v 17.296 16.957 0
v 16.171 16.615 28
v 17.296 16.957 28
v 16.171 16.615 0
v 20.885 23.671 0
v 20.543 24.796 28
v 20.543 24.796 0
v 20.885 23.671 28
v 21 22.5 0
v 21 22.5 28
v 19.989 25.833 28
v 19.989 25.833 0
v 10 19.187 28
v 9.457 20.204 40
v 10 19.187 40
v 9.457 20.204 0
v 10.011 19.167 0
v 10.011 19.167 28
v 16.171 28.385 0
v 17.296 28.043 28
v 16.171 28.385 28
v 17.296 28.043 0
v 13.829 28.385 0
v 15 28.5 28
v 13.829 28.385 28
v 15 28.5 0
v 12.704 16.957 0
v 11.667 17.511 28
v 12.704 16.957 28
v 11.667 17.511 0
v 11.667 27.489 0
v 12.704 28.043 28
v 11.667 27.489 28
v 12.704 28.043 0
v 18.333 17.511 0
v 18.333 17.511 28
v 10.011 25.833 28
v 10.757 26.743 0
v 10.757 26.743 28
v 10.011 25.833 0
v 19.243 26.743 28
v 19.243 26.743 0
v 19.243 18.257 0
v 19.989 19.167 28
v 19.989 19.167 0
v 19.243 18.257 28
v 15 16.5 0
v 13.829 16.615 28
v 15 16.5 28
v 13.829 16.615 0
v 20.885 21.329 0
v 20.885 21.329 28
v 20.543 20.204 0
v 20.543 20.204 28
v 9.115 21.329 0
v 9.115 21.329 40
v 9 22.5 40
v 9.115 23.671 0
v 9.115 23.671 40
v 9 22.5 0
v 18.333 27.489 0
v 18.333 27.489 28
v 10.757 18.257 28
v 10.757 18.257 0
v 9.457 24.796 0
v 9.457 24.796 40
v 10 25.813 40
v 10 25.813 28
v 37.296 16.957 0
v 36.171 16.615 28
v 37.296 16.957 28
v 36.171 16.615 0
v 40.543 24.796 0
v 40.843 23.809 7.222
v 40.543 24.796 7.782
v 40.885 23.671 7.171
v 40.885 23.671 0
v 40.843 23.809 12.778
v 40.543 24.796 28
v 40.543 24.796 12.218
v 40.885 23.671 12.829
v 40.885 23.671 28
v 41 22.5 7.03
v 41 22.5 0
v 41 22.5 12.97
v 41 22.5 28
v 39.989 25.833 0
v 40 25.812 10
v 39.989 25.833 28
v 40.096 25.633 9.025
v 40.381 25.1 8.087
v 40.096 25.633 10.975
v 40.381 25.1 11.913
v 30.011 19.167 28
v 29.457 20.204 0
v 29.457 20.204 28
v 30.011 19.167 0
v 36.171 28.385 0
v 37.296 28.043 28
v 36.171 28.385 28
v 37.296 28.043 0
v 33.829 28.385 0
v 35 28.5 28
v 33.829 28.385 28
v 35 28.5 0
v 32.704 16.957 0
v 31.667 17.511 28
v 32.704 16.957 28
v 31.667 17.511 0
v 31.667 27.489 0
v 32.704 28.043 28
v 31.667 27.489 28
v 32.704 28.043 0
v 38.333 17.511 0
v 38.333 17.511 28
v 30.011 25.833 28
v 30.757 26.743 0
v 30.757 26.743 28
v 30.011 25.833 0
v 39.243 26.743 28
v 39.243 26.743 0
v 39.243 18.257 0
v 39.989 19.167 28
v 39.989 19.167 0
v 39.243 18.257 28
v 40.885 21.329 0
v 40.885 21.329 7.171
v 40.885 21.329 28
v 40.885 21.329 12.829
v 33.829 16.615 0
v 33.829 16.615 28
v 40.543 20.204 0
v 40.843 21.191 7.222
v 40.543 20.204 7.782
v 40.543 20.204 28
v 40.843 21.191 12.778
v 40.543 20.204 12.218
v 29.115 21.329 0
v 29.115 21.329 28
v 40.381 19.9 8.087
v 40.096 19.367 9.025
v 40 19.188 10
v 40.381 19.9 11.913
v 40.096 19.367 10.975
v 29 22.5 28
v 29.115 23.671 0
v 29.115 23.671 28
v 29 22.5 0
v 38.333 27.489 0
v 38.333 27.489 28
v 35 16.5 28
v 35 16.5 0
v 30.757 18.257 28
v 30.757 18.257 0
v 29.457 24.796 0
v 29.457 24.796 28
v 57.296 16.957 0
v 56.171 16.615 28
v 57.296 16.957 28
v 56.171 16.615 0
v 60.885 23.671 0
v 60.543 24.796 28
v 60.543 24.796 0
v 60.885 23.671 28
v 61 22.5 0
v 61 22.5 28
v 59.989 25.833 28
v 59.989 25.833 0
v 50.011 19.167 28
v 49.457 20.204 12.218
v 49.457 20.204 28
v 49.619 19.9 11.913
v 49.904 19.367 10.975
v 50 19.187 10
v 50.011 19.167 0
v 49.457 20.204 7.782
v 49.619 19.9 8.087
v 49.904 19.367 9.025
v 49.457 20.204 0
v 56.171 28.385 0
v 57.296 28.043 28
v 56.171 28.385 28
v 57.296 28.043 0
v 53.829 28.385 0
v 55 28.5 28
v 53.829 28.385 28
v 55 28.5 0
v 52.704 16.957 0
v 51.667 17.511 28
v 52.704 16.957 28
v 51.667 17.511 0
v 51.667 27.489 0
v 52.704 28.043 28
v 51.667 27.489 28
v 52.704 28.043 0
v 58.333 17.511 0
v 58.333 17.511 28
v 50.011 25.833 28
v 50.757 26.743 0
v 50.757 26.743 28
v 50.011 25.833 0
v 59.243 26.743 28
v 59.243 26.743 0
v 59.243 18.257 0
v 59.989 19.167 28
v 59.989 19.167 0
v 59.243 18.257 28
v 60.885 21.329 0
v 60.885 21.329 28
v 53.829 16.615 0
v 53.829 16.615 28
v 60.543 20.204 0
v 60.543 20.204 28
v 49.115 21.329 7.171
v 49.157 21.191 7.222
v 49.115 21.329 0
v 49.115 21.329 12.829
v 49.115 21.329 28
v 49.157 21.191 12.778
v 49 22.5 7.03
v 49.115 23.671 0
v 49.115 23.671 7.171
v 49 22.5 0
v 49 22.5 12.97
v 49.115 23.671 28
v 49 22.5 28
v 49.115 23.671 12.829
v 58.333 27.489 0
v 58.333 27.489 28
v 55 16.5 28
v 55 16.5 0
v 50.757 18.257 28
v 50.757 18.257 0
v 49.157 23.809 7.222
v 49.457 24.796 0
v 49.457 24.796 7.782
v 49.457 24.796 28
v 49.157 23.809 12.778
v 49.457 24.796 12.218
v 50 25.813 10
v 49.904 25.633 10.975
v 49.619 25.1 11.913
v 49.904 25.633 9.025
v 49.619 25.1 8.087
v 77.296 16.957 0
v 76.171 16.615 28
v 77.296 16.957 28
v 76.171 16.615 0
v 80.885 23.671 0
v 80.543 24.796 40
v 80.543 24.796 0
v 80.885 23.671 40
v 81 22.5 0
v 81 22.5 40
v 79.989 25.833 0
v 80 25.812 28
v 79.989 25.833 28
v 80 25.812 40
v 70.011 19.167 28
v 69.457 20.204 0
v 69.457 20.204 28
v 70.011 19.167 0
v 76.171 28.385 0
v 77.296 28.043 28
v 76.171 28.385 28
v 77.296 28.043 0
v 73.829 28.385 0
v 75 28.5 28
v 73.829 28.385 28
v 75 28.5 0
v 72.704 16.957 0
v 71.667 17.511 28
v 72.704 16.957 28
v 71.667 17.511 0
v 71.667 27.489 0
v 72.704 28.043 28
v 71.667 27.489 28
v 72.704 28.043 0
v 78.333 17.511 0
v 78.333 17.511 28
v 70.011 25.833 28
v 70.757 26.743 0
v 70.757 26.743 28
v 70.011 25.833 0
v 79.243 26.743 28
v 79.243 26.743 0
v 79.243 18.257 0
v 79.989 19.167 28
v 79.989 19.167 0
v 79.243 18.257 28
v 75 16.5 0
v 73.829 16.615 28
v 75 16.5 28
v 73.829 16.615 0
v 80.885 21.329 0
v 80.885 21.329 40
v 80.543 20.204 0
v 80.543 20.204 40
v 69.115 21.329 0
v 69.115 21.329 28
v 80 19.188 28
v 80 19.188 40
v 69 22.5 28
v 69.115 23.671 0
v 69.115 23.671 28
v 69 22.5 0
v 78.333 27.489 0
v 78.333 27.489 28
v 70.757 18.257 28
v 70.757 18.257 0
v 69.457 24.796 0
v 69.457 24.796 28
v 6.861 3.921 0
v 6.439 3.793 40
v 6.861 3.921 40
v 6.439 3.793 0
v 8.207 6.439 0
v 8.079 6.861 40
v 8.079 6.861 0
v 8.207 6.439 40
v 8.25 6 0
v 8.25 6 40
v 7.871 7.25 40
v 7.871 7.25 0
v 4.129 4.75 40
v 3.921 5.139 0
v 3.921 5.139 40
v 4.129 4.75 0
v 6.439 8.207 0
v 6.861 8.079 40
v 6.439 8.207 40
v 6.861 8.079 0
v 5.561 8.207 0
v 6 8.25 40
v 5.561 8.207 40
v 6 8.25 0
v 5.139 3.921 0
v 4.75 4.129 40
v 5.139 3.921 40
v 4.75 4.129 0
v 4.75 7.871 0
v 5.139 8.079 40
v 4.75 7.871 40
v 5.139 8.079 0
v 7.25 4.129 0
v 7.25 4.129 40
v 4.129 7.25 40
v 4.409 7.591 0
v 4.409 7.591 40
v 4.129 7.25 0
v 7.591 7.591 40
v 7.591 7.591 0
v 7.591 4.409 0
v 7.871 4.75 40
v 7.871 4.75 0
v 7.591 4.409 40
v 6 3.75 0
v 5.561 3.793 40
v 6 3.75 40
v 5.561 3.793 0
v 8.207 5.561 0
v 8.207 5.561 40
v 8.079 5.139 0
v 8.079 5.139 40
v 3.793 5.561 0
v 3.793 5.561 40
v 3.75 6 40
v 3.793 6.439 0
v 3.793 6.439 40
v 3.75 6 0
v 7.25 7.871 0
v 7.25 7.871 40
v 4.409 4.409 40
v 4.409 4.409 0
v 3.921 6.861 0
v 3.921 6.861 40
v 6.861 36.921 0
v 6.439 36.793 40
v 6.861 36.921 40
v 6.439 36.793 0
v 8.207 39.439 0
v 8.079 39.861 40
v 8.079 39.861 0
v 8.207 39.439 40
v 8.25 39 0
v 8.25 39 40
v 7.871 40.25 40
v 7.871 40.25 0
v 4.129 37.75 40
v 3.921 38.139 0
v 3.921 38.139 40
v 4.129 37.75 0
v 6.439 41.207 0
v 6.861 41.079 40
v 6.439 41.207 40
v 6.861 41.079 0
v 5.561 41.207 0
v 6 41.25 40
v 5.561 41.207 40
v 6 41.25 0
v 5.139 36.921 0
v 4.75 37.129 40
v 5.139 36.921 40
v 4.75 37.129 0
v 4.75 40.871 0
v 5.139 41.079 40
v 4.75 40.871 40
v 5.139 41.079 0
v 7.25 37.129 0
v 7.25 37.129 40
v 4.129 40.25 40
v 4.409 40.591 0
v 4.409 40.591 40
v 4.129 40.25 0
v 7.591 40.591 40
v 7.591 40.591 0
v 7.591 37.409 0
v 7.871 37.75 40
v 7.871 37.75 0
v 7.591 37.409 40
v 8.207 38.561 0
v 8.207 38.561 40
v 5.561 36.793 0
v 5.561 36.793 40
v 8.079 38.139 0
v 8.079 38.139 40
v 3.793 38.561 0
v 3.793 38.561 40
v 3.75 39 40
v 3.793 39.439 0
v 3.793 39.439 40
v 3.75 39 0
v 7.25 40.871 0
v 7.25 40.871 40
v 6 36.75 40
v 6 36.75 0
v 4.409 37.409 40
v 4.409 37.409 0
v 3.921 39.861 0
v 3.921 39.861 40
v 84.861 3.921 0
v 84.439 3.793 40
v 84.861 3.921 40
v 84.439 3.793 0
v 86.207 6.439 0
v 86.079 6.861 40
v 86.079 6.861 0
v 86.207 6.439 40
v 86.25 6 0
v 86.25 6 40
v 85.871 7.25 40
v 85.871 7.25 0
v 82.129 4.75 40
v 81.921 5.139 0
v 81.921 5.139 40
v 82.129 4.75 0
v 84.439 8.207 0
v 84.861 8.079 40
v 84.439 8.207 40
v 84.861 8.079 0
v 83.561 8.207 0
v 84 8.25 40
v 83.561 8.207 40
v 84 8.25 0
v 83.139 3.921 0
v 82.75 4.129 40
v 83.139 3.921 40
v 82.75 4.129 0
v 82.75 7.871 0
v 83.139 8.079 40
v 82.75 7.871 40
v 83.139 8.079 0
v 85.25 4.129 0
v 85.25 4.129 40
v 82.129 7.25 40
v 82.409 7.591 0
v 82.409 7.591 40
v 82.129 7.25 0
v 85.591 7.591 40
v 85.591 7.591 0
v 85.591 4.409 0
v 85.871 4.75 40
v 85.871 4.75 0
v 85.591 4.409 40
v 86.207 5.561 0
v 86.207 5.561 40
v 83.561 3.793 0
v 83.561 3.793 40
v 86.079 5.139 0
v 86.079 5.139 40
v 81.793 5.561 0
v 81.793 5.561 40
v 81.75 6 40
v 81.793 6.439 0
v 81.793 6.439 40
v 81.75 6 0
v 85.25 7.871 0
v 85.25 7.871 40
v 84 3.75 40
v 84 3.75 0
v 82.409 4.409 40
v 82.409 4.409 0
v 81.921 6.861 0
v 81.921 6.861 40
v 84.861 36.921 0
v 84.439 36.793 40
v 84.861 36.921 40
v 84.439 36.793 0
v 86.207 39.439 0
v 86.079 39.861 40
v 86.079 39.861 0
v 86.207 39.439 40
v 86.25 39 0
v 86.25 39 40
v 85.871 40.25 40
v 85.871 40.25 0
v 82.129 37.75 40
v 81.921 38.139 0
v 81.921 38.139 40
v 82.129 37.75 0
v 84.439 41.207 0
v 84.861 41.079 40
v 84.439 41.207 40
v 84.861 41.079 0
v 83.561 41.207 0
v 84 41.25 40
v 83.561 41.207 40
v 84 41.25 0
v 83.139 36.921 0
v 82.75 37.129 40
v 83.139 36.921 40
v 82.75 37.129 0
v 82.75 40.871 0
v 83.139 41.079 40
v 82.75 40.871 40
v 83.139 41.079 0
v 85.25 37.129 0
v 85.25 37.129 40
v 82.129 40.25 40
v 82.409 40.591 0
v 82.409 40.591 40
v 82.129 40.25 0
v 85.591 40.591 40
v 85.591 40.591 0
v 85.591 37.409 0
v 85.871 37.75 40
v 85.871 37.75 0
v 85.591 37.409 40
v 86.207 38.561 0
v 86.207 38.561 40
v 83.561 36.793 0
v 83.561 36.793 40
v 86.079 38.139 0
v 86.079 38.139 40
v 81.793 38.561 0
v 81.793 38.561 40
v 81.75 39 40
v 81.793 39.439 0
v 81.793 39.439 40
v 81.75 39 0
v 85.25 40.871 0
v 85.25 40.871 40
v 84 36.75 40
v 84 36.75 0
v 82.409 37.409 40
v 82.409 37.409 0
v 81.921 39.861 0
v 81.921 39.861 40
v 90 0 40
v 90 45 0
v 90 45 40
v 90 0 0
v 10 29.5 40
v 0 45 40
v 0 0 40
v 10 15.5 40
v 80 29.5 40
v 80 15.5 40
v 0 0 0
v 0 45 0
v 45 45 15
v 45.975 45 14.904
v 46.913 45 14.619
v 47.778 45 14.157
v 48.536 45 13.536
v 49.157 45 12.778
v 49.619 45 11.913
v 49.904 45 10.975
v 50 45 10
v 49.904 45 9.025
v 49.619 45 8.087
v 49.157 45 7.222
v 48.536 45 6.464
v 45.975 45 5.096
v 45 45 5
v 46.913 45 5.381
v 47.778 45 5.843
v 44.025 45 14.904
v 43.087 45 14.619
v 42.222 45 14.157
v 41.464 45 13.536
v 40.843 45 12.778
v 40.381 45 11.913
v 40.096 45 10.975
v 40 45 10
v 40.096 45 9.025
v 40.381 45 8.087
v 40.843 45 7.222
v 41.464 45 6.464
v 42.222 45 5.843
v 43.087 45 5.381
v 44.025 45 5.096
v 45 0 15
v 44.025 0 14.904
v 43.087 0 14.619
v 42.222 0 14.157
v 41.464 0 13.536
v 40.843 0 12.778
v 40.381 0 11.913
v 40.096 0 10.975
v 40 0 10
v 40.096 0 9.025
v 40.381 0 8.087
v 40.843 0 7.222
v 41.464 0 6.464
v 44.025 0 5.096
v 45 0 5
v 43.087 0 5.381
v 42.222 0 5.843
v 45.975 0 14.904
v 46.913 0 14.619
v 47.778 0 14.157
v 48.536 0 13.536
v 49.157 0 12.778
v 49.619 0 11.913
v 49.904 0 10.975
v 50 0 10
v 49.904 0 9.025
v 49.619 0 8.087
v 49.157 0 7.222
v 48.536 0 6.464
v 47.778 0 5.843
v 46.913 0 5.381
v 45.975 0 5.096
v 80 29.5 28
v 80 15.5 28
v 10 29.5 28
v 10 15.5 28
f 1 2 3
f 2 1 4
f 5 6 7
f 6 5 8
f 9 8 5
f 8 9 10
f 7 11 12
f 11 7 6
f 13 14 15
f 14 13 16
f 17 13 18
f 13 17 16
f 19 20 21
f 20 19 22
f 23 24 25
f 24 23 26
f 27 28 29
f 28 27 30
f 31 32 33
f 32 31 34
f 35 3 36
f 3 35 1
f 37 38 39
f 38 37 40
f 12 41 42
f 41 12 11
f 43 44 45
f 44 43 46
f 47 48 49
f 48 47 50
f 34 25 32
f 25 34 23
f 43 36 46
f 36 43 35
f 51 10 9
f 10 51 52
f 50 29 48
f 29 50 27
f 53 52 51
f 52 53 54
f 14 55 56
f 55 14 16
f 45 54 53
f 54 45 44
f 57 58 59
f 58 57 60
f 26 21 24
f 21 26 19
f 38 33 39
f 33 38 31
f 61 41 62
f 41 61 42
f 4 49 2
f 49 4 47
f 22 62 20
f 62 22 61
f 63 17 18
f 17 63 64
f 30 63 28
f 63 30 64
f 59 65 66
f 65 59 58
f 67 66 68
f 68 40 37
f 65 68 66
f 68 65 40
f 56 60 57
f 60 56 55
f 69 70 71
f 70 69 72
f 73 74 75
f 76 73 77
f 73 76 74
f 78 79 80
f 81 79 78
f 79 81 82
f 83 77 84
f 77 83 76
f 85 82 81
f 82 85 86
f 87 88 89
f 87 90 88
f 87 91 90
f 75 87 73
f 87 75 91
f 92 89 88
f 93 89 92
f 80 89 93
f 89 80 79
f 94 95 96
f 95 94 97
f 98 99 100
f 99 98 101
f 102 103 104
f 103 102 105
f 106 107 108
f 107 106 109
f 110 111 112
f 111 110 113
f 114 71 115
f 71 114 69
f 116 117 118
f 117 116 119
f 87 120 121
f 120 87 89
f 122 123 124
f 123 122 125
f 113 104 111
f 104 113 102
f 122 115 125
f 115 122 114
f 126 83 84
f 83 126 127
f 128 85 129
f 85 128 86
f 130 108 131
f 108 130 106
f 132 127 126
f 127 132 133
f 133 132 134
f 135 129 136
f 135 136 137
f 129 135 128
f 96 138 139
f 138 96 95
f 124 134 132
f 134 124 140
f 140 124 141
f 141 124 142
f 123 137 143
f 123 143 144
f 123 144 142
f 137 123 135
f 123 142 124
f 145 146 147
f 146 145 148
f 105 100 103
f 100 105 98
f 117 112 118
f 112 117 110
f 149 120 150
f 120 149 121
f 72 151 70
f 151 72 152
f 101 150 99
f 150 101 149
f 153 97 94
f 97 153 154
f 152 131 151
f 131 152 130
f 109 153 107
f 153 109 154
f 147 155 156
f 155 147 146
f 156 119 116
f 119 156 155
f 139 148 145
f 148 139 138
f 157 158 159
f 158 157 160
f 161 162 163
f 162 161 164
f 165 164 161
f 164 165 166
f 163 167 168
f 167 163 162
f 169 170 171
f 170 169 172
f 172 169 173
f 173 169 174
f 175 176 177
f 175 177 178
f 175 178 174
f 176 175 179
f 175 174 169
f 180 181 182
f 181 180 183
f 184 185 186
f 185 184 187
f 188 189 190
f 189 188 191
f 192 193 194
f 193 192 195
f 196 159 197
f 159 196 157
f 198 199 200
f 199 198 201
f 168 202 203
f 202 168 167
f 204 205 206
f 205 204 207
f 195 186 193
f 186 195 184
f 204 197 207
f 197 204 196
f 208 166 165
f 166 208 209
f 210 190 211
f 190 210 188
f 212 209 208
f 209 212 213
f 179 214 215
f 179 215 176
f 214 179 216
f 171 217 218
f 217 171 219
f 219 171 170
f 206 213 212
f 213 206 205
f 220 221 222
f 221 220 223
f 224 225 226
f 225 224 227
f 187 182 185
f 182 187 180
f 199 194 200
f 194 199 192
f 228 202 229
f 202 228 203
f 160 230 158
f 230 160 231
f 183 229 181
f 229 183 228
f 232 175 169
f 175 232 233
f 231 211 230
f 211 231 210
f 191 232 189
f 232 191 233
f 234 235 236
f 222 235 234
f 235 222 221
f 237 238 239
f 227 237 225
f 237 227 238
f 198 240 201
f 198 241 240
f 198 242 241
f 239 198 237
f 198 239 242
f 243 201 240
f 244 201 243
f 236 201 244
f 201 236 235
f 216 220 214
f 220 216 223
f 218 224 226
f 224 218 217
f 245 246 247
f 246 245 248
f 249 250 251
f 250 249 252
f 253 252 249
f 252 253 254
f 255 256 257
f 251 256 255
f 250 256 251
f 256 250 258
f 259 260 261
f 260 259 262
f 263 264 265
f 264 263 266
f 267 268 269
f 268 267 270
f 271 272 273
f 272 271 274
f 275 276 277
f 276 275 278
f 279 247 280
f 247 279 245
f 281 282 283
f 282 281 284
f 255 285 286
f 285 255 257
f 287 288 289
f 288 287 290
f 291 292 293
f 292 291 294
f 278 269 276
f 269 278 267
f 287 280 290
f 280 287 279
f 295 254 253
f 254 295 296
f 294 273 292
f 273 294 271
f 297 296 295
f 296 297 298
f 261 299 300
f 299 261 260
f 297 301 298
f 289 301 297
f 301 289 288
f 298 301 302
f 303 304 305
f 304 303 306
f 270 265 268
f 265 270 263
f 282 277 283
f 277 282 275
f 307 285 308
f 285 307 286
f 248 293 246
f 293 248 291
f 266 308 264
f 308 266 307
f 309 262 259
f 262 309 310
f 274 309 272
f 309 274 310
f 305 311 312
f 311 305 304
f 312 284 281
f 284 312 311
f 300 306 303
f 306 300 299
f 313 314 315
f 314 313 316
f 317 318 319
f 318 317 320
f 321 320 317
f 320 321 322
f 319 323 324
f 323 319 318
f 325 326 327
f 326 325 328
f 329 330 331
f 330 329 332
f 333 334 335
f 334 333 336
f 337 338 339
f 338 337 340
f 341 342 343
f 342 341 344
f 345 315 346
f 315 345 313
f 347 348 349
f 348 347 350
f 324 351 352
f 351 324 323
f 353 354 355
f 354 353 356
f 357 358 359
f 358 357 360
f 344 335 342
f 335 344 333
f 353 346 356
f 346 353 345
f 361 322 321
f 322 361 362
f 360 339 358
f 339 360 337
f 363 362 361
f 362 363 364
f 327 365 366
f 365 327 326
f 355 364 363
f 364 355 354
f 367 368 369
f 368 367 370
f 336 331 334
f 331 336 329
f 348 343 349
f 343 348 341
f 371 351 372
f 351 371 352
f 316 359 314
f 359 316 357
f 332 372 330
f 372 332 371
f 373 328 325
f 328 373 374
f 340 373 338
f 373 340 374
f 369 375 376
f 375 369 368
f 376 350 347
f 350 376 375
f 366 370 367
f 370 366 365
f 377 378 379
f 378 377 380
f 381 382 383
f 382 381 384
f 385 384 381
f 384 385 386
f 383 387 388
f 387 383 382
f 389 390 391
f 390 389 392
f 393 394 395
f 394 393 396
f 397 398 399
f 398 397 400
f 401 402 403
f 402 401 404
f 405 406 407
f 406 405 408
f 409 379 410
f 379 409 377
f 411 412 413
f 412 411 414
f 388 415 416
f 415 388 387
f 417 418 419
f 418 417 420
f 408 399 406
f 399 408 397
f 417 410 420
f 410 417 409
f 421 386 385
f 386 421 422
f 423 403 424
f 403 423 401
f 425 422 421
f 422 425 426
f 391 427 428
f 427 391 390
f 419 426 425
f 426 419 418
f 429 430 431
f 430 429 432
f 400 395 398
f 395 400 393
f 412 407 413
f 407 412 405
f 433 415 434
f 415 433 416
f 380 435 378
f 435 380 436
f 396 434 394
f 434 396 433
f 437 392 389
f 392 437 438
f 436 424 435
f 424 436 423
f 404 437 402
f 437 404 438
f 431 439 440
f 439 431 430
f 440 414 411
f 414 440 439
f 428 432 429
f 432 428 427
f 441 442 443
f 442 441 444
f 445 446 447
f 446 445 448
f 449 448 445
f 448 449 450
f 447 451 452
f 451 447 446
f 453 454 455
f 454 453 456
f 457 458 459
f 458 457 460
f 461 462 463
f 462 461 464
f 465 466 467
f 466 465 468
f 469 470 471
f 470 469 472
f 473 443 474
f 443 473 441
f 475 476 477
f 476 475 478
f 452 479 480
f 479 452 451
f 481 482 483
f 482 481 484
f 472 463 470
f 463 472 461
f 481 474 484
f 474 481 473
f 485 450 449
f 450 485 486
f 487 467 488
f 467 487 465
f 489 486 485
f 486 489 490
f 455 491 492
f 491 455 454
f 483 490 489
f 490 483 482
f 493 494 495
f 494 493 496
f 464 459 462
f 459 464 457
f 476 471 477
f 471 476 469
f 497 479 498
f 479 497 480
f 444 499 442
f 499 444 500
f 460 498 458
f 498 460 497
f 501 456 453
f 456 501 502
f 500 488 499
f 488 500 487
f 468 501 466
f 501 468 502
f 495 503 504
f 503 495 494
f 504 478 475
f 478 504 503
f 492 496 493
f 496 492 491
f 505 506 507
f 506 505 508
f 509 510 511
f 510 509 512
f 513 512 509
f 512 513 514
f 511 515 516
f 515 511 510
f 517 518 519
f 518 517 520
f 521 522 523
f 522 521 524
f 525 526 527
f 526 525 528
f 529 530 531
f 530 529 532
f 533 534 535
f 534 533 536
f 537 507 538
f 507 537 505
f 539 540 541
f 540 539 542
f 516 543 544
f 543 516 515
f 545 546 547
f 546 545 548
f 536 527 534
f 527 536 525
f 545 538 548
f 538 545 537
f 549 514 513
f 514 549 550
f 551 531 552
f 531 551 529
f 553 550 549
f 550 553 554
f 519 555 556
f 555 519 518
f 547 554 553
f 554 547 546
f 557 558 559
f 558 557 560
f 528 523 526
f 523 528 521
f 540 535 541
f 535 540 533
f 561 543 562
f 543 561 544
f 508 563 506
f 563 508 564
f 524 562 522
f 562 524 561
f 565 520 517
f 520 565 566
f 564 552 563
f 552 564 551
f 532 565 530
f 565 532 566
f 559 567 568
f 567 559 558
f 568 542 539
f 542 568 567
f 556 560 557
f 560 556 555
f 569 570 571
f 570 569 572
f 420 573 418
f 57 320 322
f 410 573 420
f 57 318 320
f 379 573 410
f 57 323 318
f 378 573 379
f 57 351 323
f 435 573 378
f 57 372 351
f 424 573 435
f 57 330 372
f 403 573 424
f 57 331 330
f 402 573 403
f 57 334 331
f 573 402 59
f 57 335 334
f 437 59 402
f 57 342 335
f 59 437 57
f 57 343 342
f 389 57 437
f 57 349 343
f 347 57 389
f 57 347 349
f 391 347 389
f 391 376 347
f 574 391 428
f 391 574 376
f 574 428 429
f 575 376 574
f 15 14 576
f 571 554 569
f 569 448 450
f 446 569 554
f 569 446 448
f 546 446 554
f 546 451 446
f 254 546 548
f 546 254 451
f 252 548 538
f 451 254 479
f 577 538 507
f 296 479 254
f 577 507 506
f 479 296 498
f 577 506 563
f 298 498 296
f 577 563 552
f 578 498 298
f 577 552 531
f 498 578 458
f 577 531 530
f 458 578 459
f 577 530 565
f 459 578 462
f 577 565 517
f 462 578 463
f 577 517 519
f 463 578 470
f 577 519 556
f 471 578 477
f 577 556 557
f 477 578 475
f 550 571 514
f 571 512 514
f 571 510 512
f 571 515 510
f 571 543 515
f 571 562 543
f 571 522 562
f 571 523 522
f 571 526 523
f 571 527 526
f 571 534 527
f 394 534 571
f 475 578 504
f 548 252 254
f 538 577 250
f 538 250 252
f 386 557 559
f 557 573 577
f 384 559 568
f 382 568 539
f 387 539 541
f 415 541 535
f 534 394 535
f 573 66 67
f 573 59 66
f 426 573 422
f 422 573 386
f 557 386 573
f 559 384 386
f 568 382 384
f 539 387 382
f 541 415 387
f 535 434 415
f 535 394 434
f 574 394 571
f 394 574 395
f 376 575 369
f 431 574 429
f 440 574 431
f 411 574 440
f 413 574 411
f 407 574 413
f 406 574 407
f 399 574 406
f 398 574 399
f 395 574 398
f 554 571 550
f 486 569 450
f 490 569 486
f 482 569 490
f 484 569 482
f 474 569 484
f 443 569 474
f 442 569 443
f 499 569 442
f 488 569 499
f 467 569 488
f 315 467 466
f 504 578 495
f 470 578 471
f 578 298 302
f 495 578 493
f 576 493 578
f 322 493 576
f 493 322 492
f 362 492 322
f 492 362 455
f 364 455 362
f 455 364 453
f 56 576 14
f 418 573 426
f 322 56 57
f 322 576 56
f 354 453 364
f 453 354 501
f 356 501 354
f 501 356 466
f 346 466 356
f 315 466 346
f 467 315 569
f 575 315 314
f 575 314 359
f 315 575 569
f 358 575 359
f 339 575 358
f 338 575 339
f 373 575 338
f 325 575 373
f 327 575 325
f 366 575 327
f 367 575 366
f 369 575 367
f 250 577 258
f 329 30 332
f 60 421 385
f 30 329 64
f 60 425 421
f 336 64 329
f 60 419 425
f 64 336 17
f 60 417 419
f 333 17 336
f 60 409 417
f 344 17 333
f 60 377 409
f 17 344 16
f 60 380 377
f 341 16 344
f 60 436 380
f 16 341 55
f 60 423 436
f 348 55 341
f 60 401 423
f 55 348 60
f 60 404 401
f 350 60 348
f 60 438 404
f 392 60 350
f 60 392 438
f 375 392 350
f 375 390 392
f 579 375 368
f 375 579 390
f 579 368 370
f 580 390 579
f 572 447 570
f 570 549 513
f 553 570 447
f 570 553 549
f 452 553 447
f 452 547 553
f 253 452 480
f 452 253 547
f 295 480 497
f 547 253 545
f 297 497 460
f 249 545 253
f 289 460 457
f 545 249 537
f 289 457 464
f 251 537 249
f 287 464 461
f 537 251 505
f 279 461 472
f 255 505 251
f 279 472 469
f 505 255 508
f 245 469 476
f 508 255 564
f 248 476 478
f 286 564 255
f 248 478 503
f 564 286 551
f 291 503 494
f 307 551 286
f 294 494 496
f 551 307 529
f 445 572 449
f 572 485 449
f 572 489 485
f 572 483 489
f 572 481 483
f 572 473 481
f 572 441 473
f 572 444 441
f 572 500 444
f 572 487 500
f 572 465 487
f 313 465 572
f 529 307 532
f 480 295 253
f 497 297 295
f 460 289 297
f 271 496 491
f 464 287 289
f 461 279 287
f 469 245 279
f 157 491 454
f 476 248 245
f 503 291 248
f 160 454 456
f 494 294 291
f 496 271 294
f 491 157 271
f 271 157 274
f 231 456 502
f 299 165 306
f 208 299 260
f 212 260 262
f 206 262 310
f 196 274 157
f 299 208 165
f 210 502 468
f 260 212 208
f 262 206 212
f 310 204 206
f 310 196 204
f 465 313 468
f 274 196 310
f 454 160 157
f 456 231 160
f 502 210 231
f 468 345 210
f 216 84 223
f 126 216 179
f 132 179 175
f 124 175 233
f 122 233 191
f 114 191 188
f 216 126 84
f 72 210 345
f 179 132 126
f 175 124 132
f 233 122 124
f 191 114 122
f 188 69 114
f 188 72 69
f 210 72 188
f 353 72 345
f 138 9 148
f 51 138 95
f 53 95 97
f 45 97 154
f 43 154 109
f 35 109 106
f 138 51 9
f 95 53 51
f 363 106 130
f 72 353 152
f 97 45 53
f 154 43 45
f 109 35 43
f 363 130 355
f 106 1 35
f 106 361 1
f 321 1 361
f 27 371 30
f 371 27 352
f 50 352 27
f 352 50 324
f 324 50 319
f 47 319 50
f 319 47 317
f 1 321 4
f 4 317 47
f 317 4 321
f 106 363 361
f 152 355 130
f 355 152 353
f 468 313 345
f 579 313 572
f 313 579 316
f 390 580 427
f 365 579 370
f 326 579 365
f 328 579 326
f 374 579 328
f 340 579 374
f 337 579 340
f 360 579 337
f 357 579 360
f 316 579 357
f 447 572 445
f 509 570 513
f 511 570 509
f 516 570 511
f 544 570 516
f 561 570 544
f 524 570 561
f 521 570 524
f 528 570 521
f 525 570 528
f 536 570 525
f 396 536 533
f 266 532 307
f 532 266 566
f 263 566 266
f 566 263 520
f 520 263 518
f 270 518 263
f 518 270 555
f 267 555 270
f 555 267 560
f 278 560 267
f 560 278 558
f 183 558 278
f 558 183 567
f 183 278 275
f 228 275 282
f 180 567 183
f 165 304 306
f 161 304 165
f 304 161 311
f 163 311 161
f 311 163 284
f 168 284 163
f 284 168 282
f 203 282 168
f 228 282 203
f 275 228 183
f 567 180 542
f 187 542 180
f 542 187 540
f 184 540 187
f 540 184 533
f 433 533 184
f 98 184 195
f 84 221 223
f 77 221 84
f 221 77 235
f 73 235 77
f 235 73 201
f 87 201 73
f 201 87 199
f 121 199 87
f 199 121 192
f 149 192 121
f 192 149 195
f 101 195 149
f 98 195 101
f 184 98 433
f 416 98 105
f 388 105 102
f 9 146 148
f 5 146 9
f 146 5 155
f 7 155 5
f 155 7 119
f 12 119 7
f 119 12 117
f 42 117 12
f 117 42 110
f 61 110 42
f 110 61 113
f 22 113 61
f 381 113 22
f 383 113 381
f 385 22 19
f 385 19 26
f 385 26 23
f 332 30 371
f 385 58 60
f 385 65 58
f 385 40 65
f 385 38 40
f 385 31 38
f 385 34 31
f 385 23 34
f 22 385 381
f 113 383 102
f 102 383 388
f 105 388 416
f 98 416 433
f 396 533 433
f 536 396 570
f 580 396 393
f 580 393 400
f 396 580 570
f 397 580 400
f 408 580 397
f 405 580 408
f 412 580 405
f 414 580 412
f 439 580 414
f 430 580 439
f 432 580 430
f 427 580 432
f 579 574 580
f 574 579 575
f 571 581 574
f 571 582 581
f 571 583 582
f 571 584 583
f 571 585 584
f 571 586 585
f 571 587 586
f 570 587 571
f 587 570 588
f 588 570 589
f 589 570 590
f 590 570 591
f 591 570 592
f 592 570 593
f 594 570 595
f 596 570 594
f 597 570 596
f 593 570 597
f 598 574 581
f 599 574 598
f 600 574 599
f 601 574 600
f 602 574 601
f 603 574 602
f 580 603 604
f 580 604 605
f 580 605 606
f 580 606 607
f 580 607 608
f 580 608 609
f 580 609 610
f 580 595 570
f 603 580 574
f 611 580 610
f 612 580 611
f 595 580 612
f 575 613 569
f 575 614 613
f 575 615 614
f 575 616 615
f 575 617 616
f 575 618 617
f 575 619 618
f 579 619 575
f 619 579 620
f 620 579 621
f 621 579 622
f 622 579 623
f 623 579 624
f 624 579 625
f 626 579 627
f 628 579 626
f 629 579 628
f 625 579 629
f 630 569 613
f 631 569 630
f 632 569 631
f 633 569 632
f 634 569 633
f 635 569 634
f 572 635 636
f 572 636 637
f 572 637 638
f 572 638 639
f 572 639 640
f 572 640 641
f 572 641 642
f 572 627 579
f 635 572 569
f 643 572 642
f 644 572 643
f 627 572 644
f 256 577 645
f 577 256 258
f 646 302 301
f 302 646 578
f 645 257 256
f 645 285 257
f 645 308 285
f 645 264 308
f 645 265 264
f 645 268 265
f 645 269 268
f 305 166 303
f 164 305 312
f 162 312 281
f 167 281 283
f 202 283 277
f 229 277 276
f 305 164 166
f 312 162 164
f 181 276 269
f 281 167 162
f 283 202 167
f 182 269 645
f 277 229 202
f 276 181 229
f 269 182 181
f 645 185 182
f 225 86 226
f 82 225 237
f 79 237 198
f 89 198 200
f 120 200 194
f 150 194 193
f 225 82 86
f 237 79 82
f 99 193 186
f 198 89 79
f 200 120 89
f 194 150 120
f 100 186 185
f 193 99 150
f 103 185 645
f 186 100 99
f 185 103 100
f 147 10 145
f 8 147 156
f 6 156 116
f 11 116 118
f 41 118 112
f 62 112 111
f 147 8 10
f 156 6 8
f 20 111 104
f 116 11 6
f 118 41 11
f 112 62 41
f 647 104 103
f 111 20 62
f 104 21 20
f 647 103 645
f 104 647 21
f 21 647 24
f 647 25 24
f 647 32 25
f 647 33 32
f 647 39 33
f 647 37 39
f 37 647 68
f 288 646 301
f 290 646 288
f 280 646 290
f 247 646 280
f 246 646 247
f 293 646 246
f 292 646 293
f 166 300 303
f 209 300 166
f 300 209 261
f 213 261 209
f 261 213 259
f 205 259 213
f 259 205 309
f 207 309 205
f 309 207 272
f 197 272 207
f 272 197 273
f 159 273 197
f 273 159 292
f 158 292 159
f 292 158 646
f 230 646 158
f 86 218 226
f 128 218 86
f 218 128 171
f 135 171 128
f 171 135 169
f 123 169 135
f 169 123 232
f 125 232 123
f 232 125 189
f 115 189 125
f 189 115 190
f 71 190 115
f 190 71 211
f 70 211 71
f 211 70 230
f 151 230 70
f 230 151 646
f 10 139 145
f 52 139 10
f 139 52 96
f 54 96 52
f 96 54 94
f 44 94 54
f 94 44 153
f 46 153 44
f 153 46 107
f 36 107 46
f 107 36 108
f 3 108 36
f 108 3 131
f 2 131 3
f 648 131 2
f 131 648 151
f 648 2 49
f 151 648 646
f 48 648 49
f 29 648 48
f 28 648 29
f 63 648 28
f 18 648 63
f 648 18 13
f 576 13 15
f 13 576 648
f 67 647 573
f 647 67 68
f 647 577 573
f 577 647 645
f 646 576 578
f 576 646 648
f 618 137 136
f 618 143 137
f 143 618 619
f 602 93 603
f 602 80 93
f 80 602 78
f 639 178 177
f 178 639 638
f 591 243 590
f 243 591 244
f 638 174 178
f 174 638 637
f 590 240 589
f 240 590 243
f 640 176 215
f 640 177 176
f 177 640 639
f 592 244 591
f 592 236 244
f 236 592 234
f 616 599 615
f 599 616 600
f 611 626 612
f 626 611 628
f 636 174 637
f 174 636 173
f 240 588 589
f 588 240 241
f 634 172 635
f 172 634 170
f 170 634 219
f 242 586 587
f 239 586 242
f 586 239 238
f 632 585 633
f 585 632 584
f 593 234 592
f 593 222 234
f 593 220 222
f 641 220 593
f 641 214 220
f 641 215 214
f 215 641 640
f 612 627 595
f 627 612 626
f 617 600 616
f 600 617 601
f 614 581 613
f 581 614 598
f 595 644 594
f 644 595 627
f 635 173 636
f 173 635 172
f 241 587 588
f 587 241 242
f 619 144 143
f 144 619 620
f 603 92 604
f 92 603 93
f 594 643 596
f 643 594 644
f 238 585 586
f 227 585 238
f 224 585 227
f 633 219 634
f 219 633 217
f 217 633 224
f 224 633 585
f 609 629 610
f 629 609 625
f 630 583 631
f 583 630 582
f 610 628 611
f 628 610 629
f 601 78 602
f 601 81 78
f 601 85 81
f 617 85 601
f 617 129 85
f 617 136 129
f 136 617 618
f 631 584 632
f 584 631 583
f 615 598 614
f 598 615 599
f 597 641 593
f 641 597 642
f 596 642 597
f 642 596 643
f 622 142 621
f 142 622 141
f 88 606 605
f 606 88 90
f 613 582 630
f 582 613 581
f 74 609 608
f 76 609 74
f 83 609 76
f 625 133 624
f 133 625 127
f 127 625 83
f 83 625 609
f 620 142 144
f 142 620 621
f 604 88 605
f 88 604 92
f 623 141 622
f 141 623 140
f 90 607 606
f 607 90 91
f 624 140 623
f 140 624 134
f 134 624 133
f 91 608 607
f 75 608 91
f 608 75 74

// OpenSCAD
$fn = 32;

// ----------------------------------------------------------------------
// Manifold block: side_outlet manifold
// ----------------------------------------------------------------------

// --- parameters (mm) ---
block_l = 90;             // block length, X
block_w = 45;             // block width, Y
block_h = 40;             // block height, Z
port_d = 12;              // port bore diameter
port_pitch = 20;          // port pitch along X
gallery_d = 14;           // top gallery width, Y
gallery_depth = 12;       // gallery pocket depth
wall_p = 10;              // gallery end wall thickness, X
mnt_d = 4.5;              // mounting hole diameter
mnt_in = 6;               // mounting hole inset from the edges
out_d = 10;               // outlet bore diameter
out_z = 10;               // outlet axis height
fit_tol = 0.05;           // tolerance for press fits, mm
free_tol = 0.3;           // tolerance for clearance fits, mm

n_ports = 4;  // ports in the row
port_x0 = (block_l - (n_ports - 1) * port_pitch) / 2;  // first port X

difference() {
  cube([block_l, block_w, block_h]);
  for (i = [0 : n_ports - 1])
    translate([port_x0 + i * port_pitch, block_w / 2, -1])
      cylinder(h = block_h + 2, d = port_d);
  translate([wall_p, block_w / 2 - gallery_d / 2, block_h - gallery_depth])
    cube([block_l - 2 * wall_p, gallery_d, gallery_depth + 1]);
  for (cx = [mnt_in, block_l - mnt_in])
    for (cy = [mnt_in, block_w - mnt_in])
      translate([cx, cy, -1]) cylinder(h = block_h + 2, d = mnt_d);
  translate([block_l / 2, -1, out_z]) rotate([-90, 0, 0])
    cylinder(h = block_w + 2, d = out_d);
}
